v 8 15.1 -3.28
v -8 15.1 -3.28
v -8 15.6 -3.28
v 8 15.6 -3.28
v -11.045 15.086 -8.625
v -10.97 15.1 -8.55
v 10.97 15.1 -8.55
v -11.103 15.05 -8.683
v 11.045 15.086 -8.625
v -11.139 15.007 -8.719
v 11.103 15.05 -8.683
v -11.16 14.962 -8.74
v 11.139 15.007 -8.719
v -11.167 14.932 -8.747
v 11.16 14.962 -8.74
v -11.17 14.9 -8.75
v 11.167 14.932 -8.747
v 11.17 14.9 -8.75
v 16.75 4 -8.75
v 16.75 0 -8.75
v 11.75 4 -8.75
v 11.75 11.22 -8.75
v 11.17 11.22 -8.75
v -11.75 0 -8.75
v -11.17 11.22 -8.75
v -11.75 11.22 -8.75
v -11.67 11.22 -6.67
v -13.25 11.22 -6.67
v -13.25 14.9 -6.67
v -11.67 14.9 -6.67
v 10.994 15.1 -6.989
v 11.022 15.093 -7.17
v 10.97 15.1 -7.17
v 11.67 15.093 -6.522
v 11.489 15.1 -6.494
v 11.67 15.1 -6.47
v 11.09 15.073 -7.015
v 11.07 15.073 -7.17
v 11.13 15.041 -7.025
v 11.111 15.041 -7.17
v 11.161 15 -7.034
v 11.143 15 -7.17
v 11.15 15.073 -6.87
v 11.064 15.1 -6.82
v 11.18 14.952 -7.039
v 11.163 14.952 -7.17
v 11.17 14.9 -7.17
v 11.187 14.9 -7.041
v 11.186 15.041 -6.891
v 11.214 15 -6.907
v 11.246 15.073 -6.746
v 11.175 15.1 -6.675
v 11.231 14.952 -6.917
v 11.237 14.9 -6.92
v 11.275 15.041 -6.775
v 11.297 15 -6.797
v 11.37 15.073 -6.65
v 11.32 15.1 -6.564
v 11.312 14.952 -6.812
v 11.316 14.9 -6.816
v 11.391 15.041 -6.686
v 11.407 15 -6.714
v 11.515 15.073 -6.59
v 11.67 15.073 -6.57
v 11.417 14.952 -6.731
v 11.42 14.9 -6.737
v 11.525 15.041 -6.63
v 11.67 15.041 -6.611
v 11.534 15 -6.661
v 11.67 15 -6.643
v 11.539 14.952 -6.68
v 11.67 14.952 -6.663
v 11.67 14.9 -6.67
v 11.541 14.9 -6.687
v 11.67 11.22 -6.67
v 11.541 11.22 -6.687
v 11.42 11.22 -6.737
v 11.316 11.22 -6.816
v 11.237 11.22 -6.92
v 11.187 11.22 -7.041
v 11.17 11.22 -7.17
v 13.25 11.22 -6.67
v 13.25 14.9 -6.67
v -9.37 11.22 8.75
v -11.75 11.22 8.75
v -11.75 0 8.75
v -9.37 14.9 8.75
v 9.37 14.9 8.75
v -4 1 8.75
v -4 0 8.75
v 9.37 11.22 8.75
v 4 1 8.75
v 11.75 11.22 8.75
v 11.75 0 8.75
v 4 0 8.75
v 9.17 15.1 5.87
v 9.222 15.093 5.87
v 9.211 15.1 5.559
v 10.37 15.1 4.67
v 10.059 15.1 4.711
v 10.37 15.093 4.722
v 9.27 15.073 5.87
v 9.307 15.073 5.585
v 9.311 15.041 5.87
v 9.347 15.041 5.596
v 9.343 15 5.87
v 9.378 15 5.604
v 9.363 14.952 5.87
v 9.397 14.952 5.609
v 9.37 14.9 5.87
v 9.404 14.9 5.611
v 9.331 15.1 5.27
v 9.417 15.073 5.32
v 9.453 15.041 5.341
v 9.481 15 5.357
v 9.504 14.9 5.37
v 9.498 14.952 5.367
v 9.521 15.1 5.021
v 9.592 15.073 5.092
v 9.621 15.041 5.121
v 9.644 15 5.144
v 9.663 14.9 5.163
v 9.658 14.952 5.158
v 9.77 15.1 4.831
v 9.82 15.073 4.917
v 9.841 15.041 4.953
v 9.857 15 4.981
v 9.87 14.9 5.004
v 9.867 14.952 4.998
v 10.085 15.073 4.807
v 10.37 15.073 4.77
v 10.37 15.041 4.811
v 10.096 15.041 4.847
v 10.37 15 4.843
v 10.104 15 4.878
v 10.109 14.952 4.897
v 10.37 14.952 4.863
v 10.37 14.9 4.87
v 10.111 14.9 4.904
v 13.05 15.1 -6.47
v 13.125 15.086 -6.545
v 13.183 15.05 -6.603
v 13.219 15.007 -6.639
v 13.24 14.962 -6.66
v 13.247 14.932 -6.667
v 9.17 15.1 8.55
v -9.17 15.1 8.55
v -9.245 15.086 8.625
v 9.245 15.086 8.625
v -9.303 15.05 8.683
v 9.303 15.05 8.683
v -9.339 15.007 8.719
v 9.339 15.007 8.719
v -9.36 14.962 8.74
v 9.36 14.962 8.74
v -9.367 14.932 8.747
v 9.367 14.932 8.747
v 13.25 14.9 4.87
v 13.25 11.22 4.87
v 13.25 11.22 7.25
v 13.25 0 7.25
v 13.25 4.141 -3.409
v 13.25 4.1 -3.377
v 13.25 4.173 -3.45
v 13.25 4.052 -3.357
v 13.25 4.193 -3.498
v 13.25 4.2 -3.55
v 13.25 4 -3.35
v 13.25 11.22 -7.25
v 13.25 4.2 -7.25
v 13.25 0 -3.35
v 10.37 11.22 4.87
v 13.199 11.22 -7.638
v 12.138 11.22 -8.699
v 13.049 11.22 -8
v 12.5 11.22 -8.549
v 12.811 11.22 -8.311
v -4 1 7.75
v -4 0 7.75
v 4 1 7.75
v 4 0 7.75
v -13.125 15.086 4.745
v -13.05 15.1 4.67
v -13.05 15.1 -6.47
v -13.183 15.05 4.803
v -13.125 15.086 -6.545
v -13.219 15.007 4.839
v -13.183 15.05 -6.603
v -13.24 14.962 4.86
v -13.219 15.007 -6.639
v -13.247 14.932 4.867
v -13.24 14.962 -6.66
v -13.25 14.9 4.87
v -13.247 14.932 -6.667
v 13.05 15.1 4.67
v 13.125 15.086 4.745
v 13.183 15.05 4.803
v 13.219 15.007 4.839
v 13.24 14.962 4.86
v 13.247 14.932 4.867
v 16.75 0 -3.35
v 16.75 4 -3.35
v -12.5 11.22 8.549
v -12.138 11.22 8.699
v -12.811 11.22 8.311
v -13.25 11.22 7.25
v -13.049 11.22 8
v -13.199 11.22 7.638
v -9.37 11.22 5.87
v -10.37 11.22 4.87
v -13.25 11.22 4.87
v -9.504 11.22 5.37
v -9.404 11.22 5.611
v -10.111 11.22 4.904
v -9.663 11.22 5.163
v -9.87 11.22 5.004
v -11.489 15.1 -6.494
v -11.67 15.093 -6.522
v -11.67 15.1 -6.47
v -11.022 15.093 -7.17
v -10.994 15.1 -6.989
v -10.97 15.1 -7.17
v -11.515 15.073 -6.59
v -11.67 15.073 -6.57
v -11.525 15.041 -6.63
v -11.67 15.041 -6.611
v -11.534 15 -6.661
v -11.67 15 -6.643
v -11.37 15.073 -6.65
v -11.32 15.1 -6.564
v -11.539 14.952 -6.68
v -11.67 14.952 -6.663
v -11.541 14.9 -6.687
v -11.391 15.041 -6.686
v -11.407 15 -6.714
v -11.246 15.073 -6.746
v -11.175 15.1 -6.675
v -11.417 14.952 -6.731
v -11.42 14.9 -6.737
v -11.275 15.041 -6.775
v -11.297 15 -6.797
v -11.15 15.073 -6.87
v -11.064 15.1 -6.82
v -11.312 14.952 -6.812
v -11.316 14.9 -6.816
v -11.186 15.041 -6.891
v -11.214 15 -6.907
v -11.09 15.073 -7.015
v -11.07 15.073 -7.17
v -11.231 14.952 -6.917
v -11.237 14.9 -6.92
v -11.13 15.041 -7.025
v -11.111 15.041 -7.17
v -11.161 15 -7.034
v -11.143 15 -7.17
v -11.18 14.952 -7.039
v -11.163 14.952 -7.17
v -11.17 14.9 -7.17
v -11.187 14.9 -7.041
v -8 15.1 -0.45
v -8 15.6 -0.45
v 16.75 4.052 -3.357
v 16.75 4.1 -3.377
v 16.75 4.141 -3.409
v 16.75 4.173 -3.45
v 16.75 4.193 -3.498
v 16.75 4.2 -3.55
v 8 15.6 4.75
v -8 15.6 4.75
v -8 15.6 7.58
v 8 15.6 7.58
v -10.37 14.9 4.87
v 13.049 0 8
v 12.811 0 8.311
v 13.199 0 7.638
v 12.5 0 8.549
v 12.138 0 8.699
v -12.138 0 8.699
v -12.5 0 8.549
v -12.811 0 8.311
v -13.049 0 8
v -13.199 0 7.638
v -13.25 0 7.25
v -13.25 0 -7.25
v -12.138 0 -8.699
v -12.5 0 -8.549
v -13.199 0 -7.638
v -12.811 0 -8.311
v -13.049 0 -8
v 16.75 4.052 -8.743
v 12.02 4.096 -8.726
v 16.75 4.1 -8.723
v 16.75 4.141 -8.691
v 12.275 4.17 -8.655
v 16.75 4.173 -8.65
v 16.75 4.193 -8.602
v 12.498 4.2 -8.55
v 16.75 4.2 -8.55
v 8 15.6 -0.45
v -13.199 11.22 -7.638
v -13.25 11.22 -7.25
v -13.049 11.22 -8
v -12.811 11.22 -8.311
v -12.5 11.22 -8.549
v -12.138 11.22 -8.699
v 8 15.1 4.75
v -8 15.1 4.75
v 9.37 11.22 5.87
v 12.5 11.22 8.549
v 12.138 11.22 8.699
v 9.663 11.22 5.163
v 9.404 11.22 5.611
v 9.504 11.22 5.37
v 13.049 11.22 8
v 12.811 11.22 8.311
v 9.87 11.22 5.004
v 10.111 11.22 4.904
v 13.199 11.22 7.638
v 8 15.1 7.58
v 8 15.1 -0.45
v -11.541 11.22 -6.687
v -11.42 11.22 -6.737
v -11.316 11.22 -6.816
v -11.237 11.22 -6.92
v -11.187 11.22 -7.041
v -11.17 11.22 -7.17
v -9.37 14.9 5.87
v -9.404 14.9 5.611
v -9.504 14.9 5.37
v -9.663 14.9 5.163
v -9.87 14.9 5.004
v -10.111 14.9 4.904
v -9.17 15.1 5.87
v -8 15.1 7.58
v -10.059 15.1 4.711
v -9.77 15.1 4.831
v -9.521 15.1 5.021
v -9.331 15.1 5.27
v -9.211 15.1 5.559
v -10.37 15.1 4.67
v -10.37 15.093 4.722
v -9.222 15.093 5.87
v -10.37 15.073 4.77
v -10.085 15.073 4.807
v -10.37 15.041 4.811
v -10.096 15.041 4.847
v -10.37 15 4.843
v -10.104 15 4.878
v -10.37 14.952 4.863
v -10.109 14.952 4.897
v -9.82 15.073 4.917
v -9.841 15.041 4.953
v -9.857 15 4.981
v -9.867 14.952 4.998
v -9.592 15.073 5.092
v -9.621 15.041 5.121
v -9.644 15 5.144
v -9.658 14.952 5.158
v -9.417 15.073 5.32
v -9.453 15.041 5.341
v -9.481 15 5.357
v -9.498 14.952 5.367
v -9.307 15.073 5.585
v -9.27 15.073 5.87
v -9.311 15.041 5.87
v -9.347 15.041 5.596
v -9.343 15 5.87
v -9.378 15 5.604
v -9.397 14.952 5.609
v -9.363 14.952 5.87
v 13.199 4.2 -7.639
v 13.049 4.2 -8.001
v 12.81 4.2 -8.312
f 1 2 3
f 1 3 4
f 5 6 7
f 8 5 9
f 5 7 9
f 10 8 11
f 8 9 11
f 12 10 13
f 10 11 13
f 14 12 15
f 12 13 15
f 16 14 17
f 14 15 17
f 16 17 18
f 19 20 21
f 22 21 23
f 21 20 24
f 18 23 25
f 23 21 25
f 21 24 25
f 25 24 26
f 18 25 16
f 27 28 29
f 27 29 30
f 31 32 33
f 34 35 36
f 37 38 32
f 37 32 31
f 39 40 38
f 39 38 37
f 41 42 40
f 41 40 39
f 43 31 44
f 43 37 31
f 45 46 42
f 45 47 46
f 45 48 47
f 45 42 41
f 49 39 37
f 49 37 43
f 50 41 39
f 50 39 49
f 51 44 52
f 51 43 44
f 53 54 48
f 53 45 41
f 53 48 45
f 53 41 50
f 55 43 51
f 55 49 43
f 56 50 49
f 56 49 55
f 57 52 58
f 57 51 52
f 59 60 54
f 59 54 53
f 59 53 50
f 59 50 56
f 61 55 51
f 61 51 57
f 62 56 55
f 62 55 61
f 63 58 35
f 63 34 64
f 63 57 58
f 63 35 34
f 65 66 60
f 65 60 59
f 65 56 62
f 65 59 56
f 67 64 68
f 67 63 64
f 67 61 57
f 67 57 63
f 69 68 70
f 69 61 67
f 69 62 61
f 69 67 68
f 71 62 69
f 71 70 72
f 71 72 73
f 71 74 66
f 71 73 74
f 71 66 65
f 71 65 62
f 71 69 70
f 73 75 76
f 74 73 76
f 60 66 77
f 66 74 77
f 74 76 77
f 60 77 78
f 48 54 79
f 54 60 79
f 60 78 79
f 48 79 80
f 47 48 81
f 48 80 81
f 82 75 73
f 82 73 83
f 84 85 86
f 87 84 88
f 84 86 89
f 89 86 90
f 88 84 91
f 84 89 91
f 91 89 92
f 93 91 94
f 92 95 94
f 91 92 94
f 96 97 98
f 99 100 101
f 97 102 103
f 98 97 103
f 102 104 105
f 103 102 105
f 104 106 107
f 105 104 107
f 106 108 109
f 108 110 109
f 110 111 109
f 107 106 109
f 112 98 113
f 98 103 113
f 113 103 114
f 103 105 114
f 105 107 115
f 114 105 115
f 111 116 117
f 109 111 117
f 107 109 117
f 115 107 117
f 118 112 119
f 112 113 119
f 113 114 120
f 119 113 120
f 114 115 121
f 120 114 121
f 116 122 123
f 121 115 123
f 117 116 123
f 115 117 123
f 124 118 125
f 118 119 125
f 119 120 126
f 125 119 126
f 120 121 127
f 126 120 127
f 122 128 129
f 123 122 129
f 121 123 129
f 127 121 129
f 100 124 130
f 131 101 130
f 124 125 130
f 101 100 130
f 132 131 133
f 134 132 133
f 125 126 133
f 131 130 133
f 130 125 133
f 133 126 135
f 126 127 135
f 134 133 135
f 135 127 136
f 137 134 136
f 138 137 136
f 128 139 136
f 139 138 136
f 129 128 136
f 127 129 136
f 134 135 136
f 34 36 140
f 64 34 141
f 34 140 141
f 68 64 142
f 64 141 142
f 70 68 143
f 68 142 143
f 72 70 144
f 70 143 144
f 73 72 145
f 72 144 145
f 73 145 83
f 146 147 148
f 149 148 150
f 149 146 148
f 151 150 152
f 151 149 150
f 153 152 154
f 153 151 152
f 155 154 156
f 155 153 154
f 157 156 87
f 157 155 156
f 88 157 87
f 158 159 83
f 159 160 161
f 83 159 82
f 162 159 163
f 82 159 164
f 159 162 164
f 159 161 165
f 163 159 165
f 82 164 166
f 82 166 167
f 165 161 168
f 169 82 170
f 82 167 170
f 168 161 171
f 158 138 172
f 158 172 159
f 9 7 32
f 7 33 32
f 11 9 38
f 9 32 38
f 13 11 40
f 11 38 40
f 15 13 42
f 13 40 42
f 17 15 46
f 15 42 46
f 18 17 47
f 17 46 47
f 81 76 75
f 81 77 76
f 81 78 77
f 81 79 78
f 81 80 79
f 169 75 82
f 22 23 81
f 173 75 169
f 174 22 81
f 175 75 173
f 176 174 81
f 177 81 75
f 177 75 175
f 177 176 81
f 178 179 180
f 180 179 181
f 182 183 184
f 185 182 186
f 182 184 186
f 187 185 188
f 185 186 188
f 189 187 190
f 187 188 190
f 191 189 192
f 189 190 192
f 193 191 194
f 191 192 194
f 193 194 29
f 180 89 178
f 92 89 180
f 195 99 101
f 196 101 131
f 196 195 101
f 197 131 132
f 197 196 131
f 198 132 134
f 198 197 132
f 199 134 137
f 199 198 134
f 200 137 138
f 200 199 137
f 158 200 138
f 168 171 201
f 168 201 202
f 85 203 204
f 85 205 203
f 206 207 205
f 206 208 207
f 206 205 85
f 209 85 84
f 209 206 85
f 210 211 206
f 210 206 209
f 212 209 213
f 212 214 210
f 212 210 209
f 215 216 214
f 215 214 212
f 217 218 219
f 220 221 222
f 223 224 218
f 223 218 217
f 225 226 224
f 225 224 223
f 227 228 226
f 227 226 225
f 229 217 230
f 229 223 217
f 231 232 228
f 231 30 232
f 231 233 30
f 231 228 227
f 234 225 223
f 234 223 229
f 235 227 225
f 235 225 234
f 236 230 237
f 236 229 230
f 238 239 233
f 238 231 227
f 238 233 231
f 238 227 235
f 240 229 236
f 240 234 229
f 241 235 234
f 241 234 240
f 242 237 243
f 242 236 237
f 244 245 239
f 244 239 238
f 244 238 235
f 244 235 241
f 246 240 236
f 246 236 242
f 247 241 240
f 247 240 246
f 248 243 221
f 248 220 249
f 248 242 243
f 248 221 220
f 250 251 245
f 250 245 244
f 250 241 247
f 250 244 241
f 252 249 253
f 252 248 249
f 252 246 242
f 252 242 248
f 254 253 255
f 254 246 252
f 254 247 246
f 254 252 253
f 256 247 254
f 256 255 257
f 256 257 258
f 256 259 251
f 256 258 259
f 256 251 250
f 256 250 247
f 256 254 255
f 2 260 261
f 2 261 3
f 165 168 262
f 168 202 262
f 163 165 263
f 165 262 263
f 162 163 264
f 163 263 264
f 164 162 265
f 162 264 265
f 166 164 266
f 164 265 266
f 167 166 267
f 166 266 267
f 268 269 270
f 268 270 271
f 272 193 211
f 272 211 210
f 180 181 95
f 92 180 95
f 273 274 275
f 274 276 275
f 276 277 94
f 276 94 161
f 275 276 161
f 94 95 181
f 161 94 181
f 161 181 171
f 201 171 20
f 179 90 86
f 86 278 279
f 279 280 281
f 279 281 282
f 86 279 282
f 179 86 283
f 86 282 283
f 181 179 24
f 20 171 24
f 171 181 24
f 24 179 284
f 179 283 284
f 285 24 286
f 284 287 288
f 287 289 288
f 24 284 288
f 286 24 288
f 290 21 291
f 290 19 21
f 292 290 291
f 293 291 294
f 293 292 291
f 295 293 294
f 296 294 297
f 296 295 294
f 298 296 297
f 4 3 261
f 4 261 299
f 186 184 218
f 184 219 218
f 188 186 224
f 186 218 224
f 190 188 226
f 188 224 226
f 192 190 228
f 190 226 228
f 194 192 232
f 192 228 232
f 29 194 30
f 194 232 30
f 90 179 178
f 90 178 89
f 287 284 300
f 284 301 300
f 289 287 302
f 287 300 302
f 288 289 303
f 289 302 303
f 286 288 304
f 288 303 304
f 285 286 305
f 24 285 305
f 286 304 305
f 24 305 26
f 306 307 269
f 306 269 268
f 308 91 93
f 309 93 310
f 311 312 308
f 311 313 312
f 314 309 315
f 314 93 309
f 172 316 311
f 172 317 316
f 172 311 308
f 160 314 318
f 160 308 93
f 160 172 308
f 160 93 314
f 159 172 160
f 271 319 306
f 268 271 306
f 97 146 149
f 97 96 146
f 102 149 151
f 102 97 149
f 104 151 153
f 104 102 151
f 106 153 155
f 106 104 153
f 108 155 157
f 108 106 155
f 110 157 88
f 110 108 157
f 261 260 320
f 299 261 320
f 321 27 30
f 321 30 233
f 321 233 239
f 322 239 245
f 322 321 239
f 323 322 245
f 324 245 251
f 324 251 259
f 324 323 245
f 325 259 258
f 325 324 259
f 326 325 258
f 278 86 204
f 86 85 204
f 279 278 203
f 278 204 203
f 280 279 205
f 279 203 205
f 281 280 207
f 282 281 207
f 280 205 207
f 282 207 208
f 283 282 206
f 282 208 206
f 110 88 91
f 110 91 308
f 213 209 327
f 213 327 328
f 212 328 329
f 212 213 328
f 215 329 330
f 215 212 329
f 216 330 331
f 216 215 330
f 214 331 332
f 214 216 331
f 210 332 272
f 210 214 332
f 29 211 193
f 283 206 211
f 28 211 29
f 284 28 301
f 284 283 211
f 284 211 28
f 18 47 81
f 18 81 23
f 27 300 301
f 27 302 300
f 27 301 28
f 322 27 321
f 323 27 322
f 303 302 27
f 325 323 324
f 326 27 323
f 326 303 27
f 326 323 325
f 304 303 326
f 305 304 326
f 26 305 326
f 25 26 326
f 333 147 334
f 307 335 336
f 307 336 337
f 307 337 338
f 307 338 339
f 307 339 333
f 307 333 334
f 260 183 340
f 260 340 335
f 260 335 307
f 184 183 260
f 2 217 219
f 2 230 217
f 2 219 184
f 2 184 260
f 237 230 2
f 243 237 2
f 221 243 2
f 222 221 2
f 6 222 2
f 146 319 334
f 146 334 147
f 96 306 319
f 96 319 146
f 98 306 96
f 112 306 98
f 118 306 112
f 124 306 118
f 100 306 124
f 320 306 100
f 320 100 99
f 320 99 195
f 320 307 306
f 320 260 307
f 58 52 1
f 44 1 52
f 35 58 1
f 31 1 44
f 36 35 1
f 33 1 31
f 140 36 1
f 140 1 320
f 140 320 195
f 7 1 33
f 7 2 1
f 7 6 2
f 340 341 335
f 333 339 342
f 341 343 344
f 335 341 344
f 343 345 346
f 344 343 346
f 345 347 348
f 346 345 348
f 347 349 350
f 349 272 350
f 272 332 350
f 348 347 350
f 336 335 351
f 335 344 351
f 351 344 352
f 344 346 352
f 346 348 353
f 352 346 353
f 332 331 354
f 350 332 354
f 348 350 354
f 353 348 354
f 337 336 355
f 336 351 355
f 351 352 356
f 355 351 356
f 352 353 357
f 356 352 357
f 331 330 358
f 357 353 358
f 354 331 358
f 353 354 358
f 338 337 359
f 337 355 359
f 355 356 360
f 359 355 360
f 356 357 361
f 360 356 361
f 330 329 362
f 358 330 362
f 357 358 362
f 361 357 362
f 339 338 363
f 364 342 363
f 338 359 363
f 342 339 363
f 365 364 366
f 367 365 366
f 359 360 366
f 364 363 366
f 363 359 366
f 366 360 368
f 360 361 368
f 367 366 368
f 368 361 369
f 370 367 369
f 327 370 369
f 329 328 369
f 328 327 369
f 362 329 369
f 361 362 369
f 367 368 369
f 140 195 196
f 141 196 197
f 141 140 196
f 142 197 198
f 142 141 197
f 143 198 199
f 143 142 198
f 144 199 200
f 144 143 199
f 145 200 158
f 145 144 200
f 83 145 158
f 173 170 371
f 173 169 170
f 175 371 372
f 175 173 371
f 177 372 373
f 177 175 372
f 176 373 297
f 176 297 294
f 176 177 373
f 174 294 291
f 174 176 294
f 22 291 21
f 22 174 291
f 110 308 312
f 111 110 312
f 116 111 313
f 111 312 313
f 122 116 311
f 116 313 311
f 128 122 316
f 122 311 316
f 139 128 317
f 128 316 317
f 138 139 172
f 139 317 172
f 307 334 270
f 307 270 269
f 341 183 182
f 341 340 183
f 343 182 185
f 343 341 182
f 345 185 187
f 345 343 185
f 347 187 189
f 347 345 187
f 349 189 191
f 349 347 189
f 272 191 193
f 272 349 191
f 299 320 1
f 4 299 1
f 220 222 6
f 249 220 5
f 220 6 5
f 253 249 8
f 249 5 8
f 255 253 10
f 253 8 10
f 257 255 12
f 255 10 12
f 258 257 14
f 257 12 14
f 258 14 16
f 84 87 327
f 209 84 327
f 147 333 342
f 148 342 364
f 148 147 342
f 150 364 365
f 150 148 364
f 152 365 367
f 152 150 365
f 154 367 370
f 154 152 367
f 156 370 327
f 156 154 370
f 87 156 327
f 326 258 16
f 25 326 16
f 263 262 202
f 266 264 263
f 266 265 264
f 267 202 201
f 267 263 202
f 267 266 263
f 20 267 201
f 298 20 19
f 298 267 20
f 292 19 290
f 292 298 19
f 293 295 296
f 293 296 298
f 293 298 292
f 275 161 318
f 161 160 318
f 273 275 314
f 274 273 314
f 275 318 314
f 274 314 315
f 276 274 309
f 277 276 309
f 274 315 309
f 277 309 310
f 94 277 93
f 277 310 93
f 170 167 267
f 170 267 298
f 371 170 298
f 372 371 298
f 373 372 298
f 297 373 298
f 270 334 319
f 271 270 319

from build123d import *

# Parameters (mm, degrees)
SKETCH_1_W          = 26.5
SKETCH_1_H          = 17.5
EXTRUDE_1_DEPTH     = 15.1
SKETCH_2_W          = 5.4
SKETCH_2_H          = 4.2
EXTRUDE_2_DEPTH     = 3.5
SKETCH_3_W          = 2.08
SKETCH_3_H          = 2.08
SKETCH_3_W_2        = 3.88
SKETCH_3_H_2        = 3.88
CUT_EXTRUDE_1_DEPTH = 3.88
SKETCH_4_W          = 8
SKETCH_4_H          = 2
CUT_EXTRUDE_2_DEPTH = 1
FILLET_1_R          = 1.5
FILLET_2_R          = 1
FILLET_3_R          = 0.5
FILLET_4_R          = 0.2
SKETCH_5_W          = 16
SKETCH_5_H          = 2.83
EXTRUDE_3_DEPTH     = 0.5


with BuildPart() as part:
    # 草图1 → 凸台-拉伸1 (new body)
    with BuildSketch(Plane(origin=(0, 0, 0), x_dir=(1, 0, 0), z_dir=(0, 1, 0))):
        Rectangle(SKETCH_1_W, SKETCH_1_H)
    extrude(amount=EXTRUDE_1_DEPTH)

    # 草图2 → 凸台-拉伸2 (add)
    with BuildSketch(Plane(origin=(13.25, 0, 0), x_dir=(0, 0, -1), z_dir=(1, 0, 0))):
        with Locations((6.05, 2.1)):
            Rectangle(SKETCH_2_W, SKETCH_2_H)
    extrude(amount=EXTRUDE_2_DEPTH)

    # 草图3 → 切除-拉伸1 (cut)
    with BuildSketch(Plane(origin=(0, 15.1, 0), x_dir=(1, 0, 0), z_dir=(0, 1, 0))):
        with Locations((-12.21, 7.71)):
            Rectangle(SKETCH_3_W, SKETCH_3_H)
        with Locations((-11.31, -6.81)):
            Rectangle(SKETCH_3_W_2, SKETCH_3_H_2)
        with Locations((11.31, -6.81)):
            Rectangle(SKETCH_3_W_2, SKETCH_3_H_2)
        with Locations((12.21, 7.71)):
            Rectangle(SKETCH_3_W, SKETCH_3_H)
    extrude(amount=-CUT_EXTRUDE_1_DEPTH, mode=Mode.SUBTRACT)

    # 草图4 → 切除-拉伸2 (cut)
    with BuildSketch(Plane.XZ):
        with Locations((0, 8.75)):
            Rectangle(SKETCH_4_W, SKETCH_4_H)
    extrude(amount=-CUT_EXTRUDE_2_DEPTH, mode=Mode.SUBTRACT)

    # 圆角1
    fillet_1_edges = [part.edges().sort_by_distance(p)[0] for p in [
        (13.25, 5.61, 8.75),
        (-13.25, 5.61, 8.75),
        (-13.25, 5.61, -8.75),
        (13.25, 7.71, -8.75),
    ]]
    fillet(fillet_1_edges, radius=FILLET_1_R)

    # 圆角2
    fillet_2_edges = [part.edges().sort_by_distance(p)[0] for p in [
        (9.37, 13.16, 4.87),
        (-9.37, 13.16, 4.87),
    ]]
    fillet(fillet_2_edges, radius=FILLET_2_R)

    # 圆角3
    fillet_3_edges = [part.edges().sort_by_distance(p)[0] for p in [
        (11.17, 13.16, -6.67),
        (-11.17, 13.16, -6.67),
    ]]
    fillet(fillet_3_edges, radius=FILLET_3_R)

    # 圆角4
    fillet_4_edges = [part.edges().sort_by_distance(p)[0] for p in [
        (9.37, 15.1, 7.31),
        (-11.81, 15.1, 4.87),
        (9.662893219, 15.1, 5.162893219),
        (-9.662893219, 15.1, 5.162893219),
        (-11.17, 15.1, -7.96),
        (12.46, 15.1, -6.67),
        (-11.316446609, 15.1, -6.816446609),
        (11.316446609, 15.1, -6.816446609),
        (14.25, 4.2, -8.75),
        (15, 4.2, -3.35),
        (13.25, 15.1, -0.9),
        (0, 15.1, -8.75),
        (-13.25, 15.1, -0.9),
        (0, 15.1, 8.75),
        (11.17, 15.1, -7.96),
        (11.81, 15.1, 4.87),
        (-9.37, 15.1, 7.31),
        (-12.46, 15.1, -6.67),
    ]]
    fillet(fillet_4_edges, radius=FILLET_4_R)

    # 草图5 → 凸台-拉伸3 (add)
    with BuildSketch(Plane(origin=(0, 15.1, 0), x_dir=(1, 0, 0), z_dir=(0, 1, 0))):
        with Locations((0, 1.865)):
            Rectangle(SKETCH_5_W, SKETCH_5_H)
        with Locations((0, -6.165)):
            Rectangle(SKETCH_5_W, SKETCH_5_H)
    extrude(amount=EXTRUDE_3_DEPTH)


solid = part.part
